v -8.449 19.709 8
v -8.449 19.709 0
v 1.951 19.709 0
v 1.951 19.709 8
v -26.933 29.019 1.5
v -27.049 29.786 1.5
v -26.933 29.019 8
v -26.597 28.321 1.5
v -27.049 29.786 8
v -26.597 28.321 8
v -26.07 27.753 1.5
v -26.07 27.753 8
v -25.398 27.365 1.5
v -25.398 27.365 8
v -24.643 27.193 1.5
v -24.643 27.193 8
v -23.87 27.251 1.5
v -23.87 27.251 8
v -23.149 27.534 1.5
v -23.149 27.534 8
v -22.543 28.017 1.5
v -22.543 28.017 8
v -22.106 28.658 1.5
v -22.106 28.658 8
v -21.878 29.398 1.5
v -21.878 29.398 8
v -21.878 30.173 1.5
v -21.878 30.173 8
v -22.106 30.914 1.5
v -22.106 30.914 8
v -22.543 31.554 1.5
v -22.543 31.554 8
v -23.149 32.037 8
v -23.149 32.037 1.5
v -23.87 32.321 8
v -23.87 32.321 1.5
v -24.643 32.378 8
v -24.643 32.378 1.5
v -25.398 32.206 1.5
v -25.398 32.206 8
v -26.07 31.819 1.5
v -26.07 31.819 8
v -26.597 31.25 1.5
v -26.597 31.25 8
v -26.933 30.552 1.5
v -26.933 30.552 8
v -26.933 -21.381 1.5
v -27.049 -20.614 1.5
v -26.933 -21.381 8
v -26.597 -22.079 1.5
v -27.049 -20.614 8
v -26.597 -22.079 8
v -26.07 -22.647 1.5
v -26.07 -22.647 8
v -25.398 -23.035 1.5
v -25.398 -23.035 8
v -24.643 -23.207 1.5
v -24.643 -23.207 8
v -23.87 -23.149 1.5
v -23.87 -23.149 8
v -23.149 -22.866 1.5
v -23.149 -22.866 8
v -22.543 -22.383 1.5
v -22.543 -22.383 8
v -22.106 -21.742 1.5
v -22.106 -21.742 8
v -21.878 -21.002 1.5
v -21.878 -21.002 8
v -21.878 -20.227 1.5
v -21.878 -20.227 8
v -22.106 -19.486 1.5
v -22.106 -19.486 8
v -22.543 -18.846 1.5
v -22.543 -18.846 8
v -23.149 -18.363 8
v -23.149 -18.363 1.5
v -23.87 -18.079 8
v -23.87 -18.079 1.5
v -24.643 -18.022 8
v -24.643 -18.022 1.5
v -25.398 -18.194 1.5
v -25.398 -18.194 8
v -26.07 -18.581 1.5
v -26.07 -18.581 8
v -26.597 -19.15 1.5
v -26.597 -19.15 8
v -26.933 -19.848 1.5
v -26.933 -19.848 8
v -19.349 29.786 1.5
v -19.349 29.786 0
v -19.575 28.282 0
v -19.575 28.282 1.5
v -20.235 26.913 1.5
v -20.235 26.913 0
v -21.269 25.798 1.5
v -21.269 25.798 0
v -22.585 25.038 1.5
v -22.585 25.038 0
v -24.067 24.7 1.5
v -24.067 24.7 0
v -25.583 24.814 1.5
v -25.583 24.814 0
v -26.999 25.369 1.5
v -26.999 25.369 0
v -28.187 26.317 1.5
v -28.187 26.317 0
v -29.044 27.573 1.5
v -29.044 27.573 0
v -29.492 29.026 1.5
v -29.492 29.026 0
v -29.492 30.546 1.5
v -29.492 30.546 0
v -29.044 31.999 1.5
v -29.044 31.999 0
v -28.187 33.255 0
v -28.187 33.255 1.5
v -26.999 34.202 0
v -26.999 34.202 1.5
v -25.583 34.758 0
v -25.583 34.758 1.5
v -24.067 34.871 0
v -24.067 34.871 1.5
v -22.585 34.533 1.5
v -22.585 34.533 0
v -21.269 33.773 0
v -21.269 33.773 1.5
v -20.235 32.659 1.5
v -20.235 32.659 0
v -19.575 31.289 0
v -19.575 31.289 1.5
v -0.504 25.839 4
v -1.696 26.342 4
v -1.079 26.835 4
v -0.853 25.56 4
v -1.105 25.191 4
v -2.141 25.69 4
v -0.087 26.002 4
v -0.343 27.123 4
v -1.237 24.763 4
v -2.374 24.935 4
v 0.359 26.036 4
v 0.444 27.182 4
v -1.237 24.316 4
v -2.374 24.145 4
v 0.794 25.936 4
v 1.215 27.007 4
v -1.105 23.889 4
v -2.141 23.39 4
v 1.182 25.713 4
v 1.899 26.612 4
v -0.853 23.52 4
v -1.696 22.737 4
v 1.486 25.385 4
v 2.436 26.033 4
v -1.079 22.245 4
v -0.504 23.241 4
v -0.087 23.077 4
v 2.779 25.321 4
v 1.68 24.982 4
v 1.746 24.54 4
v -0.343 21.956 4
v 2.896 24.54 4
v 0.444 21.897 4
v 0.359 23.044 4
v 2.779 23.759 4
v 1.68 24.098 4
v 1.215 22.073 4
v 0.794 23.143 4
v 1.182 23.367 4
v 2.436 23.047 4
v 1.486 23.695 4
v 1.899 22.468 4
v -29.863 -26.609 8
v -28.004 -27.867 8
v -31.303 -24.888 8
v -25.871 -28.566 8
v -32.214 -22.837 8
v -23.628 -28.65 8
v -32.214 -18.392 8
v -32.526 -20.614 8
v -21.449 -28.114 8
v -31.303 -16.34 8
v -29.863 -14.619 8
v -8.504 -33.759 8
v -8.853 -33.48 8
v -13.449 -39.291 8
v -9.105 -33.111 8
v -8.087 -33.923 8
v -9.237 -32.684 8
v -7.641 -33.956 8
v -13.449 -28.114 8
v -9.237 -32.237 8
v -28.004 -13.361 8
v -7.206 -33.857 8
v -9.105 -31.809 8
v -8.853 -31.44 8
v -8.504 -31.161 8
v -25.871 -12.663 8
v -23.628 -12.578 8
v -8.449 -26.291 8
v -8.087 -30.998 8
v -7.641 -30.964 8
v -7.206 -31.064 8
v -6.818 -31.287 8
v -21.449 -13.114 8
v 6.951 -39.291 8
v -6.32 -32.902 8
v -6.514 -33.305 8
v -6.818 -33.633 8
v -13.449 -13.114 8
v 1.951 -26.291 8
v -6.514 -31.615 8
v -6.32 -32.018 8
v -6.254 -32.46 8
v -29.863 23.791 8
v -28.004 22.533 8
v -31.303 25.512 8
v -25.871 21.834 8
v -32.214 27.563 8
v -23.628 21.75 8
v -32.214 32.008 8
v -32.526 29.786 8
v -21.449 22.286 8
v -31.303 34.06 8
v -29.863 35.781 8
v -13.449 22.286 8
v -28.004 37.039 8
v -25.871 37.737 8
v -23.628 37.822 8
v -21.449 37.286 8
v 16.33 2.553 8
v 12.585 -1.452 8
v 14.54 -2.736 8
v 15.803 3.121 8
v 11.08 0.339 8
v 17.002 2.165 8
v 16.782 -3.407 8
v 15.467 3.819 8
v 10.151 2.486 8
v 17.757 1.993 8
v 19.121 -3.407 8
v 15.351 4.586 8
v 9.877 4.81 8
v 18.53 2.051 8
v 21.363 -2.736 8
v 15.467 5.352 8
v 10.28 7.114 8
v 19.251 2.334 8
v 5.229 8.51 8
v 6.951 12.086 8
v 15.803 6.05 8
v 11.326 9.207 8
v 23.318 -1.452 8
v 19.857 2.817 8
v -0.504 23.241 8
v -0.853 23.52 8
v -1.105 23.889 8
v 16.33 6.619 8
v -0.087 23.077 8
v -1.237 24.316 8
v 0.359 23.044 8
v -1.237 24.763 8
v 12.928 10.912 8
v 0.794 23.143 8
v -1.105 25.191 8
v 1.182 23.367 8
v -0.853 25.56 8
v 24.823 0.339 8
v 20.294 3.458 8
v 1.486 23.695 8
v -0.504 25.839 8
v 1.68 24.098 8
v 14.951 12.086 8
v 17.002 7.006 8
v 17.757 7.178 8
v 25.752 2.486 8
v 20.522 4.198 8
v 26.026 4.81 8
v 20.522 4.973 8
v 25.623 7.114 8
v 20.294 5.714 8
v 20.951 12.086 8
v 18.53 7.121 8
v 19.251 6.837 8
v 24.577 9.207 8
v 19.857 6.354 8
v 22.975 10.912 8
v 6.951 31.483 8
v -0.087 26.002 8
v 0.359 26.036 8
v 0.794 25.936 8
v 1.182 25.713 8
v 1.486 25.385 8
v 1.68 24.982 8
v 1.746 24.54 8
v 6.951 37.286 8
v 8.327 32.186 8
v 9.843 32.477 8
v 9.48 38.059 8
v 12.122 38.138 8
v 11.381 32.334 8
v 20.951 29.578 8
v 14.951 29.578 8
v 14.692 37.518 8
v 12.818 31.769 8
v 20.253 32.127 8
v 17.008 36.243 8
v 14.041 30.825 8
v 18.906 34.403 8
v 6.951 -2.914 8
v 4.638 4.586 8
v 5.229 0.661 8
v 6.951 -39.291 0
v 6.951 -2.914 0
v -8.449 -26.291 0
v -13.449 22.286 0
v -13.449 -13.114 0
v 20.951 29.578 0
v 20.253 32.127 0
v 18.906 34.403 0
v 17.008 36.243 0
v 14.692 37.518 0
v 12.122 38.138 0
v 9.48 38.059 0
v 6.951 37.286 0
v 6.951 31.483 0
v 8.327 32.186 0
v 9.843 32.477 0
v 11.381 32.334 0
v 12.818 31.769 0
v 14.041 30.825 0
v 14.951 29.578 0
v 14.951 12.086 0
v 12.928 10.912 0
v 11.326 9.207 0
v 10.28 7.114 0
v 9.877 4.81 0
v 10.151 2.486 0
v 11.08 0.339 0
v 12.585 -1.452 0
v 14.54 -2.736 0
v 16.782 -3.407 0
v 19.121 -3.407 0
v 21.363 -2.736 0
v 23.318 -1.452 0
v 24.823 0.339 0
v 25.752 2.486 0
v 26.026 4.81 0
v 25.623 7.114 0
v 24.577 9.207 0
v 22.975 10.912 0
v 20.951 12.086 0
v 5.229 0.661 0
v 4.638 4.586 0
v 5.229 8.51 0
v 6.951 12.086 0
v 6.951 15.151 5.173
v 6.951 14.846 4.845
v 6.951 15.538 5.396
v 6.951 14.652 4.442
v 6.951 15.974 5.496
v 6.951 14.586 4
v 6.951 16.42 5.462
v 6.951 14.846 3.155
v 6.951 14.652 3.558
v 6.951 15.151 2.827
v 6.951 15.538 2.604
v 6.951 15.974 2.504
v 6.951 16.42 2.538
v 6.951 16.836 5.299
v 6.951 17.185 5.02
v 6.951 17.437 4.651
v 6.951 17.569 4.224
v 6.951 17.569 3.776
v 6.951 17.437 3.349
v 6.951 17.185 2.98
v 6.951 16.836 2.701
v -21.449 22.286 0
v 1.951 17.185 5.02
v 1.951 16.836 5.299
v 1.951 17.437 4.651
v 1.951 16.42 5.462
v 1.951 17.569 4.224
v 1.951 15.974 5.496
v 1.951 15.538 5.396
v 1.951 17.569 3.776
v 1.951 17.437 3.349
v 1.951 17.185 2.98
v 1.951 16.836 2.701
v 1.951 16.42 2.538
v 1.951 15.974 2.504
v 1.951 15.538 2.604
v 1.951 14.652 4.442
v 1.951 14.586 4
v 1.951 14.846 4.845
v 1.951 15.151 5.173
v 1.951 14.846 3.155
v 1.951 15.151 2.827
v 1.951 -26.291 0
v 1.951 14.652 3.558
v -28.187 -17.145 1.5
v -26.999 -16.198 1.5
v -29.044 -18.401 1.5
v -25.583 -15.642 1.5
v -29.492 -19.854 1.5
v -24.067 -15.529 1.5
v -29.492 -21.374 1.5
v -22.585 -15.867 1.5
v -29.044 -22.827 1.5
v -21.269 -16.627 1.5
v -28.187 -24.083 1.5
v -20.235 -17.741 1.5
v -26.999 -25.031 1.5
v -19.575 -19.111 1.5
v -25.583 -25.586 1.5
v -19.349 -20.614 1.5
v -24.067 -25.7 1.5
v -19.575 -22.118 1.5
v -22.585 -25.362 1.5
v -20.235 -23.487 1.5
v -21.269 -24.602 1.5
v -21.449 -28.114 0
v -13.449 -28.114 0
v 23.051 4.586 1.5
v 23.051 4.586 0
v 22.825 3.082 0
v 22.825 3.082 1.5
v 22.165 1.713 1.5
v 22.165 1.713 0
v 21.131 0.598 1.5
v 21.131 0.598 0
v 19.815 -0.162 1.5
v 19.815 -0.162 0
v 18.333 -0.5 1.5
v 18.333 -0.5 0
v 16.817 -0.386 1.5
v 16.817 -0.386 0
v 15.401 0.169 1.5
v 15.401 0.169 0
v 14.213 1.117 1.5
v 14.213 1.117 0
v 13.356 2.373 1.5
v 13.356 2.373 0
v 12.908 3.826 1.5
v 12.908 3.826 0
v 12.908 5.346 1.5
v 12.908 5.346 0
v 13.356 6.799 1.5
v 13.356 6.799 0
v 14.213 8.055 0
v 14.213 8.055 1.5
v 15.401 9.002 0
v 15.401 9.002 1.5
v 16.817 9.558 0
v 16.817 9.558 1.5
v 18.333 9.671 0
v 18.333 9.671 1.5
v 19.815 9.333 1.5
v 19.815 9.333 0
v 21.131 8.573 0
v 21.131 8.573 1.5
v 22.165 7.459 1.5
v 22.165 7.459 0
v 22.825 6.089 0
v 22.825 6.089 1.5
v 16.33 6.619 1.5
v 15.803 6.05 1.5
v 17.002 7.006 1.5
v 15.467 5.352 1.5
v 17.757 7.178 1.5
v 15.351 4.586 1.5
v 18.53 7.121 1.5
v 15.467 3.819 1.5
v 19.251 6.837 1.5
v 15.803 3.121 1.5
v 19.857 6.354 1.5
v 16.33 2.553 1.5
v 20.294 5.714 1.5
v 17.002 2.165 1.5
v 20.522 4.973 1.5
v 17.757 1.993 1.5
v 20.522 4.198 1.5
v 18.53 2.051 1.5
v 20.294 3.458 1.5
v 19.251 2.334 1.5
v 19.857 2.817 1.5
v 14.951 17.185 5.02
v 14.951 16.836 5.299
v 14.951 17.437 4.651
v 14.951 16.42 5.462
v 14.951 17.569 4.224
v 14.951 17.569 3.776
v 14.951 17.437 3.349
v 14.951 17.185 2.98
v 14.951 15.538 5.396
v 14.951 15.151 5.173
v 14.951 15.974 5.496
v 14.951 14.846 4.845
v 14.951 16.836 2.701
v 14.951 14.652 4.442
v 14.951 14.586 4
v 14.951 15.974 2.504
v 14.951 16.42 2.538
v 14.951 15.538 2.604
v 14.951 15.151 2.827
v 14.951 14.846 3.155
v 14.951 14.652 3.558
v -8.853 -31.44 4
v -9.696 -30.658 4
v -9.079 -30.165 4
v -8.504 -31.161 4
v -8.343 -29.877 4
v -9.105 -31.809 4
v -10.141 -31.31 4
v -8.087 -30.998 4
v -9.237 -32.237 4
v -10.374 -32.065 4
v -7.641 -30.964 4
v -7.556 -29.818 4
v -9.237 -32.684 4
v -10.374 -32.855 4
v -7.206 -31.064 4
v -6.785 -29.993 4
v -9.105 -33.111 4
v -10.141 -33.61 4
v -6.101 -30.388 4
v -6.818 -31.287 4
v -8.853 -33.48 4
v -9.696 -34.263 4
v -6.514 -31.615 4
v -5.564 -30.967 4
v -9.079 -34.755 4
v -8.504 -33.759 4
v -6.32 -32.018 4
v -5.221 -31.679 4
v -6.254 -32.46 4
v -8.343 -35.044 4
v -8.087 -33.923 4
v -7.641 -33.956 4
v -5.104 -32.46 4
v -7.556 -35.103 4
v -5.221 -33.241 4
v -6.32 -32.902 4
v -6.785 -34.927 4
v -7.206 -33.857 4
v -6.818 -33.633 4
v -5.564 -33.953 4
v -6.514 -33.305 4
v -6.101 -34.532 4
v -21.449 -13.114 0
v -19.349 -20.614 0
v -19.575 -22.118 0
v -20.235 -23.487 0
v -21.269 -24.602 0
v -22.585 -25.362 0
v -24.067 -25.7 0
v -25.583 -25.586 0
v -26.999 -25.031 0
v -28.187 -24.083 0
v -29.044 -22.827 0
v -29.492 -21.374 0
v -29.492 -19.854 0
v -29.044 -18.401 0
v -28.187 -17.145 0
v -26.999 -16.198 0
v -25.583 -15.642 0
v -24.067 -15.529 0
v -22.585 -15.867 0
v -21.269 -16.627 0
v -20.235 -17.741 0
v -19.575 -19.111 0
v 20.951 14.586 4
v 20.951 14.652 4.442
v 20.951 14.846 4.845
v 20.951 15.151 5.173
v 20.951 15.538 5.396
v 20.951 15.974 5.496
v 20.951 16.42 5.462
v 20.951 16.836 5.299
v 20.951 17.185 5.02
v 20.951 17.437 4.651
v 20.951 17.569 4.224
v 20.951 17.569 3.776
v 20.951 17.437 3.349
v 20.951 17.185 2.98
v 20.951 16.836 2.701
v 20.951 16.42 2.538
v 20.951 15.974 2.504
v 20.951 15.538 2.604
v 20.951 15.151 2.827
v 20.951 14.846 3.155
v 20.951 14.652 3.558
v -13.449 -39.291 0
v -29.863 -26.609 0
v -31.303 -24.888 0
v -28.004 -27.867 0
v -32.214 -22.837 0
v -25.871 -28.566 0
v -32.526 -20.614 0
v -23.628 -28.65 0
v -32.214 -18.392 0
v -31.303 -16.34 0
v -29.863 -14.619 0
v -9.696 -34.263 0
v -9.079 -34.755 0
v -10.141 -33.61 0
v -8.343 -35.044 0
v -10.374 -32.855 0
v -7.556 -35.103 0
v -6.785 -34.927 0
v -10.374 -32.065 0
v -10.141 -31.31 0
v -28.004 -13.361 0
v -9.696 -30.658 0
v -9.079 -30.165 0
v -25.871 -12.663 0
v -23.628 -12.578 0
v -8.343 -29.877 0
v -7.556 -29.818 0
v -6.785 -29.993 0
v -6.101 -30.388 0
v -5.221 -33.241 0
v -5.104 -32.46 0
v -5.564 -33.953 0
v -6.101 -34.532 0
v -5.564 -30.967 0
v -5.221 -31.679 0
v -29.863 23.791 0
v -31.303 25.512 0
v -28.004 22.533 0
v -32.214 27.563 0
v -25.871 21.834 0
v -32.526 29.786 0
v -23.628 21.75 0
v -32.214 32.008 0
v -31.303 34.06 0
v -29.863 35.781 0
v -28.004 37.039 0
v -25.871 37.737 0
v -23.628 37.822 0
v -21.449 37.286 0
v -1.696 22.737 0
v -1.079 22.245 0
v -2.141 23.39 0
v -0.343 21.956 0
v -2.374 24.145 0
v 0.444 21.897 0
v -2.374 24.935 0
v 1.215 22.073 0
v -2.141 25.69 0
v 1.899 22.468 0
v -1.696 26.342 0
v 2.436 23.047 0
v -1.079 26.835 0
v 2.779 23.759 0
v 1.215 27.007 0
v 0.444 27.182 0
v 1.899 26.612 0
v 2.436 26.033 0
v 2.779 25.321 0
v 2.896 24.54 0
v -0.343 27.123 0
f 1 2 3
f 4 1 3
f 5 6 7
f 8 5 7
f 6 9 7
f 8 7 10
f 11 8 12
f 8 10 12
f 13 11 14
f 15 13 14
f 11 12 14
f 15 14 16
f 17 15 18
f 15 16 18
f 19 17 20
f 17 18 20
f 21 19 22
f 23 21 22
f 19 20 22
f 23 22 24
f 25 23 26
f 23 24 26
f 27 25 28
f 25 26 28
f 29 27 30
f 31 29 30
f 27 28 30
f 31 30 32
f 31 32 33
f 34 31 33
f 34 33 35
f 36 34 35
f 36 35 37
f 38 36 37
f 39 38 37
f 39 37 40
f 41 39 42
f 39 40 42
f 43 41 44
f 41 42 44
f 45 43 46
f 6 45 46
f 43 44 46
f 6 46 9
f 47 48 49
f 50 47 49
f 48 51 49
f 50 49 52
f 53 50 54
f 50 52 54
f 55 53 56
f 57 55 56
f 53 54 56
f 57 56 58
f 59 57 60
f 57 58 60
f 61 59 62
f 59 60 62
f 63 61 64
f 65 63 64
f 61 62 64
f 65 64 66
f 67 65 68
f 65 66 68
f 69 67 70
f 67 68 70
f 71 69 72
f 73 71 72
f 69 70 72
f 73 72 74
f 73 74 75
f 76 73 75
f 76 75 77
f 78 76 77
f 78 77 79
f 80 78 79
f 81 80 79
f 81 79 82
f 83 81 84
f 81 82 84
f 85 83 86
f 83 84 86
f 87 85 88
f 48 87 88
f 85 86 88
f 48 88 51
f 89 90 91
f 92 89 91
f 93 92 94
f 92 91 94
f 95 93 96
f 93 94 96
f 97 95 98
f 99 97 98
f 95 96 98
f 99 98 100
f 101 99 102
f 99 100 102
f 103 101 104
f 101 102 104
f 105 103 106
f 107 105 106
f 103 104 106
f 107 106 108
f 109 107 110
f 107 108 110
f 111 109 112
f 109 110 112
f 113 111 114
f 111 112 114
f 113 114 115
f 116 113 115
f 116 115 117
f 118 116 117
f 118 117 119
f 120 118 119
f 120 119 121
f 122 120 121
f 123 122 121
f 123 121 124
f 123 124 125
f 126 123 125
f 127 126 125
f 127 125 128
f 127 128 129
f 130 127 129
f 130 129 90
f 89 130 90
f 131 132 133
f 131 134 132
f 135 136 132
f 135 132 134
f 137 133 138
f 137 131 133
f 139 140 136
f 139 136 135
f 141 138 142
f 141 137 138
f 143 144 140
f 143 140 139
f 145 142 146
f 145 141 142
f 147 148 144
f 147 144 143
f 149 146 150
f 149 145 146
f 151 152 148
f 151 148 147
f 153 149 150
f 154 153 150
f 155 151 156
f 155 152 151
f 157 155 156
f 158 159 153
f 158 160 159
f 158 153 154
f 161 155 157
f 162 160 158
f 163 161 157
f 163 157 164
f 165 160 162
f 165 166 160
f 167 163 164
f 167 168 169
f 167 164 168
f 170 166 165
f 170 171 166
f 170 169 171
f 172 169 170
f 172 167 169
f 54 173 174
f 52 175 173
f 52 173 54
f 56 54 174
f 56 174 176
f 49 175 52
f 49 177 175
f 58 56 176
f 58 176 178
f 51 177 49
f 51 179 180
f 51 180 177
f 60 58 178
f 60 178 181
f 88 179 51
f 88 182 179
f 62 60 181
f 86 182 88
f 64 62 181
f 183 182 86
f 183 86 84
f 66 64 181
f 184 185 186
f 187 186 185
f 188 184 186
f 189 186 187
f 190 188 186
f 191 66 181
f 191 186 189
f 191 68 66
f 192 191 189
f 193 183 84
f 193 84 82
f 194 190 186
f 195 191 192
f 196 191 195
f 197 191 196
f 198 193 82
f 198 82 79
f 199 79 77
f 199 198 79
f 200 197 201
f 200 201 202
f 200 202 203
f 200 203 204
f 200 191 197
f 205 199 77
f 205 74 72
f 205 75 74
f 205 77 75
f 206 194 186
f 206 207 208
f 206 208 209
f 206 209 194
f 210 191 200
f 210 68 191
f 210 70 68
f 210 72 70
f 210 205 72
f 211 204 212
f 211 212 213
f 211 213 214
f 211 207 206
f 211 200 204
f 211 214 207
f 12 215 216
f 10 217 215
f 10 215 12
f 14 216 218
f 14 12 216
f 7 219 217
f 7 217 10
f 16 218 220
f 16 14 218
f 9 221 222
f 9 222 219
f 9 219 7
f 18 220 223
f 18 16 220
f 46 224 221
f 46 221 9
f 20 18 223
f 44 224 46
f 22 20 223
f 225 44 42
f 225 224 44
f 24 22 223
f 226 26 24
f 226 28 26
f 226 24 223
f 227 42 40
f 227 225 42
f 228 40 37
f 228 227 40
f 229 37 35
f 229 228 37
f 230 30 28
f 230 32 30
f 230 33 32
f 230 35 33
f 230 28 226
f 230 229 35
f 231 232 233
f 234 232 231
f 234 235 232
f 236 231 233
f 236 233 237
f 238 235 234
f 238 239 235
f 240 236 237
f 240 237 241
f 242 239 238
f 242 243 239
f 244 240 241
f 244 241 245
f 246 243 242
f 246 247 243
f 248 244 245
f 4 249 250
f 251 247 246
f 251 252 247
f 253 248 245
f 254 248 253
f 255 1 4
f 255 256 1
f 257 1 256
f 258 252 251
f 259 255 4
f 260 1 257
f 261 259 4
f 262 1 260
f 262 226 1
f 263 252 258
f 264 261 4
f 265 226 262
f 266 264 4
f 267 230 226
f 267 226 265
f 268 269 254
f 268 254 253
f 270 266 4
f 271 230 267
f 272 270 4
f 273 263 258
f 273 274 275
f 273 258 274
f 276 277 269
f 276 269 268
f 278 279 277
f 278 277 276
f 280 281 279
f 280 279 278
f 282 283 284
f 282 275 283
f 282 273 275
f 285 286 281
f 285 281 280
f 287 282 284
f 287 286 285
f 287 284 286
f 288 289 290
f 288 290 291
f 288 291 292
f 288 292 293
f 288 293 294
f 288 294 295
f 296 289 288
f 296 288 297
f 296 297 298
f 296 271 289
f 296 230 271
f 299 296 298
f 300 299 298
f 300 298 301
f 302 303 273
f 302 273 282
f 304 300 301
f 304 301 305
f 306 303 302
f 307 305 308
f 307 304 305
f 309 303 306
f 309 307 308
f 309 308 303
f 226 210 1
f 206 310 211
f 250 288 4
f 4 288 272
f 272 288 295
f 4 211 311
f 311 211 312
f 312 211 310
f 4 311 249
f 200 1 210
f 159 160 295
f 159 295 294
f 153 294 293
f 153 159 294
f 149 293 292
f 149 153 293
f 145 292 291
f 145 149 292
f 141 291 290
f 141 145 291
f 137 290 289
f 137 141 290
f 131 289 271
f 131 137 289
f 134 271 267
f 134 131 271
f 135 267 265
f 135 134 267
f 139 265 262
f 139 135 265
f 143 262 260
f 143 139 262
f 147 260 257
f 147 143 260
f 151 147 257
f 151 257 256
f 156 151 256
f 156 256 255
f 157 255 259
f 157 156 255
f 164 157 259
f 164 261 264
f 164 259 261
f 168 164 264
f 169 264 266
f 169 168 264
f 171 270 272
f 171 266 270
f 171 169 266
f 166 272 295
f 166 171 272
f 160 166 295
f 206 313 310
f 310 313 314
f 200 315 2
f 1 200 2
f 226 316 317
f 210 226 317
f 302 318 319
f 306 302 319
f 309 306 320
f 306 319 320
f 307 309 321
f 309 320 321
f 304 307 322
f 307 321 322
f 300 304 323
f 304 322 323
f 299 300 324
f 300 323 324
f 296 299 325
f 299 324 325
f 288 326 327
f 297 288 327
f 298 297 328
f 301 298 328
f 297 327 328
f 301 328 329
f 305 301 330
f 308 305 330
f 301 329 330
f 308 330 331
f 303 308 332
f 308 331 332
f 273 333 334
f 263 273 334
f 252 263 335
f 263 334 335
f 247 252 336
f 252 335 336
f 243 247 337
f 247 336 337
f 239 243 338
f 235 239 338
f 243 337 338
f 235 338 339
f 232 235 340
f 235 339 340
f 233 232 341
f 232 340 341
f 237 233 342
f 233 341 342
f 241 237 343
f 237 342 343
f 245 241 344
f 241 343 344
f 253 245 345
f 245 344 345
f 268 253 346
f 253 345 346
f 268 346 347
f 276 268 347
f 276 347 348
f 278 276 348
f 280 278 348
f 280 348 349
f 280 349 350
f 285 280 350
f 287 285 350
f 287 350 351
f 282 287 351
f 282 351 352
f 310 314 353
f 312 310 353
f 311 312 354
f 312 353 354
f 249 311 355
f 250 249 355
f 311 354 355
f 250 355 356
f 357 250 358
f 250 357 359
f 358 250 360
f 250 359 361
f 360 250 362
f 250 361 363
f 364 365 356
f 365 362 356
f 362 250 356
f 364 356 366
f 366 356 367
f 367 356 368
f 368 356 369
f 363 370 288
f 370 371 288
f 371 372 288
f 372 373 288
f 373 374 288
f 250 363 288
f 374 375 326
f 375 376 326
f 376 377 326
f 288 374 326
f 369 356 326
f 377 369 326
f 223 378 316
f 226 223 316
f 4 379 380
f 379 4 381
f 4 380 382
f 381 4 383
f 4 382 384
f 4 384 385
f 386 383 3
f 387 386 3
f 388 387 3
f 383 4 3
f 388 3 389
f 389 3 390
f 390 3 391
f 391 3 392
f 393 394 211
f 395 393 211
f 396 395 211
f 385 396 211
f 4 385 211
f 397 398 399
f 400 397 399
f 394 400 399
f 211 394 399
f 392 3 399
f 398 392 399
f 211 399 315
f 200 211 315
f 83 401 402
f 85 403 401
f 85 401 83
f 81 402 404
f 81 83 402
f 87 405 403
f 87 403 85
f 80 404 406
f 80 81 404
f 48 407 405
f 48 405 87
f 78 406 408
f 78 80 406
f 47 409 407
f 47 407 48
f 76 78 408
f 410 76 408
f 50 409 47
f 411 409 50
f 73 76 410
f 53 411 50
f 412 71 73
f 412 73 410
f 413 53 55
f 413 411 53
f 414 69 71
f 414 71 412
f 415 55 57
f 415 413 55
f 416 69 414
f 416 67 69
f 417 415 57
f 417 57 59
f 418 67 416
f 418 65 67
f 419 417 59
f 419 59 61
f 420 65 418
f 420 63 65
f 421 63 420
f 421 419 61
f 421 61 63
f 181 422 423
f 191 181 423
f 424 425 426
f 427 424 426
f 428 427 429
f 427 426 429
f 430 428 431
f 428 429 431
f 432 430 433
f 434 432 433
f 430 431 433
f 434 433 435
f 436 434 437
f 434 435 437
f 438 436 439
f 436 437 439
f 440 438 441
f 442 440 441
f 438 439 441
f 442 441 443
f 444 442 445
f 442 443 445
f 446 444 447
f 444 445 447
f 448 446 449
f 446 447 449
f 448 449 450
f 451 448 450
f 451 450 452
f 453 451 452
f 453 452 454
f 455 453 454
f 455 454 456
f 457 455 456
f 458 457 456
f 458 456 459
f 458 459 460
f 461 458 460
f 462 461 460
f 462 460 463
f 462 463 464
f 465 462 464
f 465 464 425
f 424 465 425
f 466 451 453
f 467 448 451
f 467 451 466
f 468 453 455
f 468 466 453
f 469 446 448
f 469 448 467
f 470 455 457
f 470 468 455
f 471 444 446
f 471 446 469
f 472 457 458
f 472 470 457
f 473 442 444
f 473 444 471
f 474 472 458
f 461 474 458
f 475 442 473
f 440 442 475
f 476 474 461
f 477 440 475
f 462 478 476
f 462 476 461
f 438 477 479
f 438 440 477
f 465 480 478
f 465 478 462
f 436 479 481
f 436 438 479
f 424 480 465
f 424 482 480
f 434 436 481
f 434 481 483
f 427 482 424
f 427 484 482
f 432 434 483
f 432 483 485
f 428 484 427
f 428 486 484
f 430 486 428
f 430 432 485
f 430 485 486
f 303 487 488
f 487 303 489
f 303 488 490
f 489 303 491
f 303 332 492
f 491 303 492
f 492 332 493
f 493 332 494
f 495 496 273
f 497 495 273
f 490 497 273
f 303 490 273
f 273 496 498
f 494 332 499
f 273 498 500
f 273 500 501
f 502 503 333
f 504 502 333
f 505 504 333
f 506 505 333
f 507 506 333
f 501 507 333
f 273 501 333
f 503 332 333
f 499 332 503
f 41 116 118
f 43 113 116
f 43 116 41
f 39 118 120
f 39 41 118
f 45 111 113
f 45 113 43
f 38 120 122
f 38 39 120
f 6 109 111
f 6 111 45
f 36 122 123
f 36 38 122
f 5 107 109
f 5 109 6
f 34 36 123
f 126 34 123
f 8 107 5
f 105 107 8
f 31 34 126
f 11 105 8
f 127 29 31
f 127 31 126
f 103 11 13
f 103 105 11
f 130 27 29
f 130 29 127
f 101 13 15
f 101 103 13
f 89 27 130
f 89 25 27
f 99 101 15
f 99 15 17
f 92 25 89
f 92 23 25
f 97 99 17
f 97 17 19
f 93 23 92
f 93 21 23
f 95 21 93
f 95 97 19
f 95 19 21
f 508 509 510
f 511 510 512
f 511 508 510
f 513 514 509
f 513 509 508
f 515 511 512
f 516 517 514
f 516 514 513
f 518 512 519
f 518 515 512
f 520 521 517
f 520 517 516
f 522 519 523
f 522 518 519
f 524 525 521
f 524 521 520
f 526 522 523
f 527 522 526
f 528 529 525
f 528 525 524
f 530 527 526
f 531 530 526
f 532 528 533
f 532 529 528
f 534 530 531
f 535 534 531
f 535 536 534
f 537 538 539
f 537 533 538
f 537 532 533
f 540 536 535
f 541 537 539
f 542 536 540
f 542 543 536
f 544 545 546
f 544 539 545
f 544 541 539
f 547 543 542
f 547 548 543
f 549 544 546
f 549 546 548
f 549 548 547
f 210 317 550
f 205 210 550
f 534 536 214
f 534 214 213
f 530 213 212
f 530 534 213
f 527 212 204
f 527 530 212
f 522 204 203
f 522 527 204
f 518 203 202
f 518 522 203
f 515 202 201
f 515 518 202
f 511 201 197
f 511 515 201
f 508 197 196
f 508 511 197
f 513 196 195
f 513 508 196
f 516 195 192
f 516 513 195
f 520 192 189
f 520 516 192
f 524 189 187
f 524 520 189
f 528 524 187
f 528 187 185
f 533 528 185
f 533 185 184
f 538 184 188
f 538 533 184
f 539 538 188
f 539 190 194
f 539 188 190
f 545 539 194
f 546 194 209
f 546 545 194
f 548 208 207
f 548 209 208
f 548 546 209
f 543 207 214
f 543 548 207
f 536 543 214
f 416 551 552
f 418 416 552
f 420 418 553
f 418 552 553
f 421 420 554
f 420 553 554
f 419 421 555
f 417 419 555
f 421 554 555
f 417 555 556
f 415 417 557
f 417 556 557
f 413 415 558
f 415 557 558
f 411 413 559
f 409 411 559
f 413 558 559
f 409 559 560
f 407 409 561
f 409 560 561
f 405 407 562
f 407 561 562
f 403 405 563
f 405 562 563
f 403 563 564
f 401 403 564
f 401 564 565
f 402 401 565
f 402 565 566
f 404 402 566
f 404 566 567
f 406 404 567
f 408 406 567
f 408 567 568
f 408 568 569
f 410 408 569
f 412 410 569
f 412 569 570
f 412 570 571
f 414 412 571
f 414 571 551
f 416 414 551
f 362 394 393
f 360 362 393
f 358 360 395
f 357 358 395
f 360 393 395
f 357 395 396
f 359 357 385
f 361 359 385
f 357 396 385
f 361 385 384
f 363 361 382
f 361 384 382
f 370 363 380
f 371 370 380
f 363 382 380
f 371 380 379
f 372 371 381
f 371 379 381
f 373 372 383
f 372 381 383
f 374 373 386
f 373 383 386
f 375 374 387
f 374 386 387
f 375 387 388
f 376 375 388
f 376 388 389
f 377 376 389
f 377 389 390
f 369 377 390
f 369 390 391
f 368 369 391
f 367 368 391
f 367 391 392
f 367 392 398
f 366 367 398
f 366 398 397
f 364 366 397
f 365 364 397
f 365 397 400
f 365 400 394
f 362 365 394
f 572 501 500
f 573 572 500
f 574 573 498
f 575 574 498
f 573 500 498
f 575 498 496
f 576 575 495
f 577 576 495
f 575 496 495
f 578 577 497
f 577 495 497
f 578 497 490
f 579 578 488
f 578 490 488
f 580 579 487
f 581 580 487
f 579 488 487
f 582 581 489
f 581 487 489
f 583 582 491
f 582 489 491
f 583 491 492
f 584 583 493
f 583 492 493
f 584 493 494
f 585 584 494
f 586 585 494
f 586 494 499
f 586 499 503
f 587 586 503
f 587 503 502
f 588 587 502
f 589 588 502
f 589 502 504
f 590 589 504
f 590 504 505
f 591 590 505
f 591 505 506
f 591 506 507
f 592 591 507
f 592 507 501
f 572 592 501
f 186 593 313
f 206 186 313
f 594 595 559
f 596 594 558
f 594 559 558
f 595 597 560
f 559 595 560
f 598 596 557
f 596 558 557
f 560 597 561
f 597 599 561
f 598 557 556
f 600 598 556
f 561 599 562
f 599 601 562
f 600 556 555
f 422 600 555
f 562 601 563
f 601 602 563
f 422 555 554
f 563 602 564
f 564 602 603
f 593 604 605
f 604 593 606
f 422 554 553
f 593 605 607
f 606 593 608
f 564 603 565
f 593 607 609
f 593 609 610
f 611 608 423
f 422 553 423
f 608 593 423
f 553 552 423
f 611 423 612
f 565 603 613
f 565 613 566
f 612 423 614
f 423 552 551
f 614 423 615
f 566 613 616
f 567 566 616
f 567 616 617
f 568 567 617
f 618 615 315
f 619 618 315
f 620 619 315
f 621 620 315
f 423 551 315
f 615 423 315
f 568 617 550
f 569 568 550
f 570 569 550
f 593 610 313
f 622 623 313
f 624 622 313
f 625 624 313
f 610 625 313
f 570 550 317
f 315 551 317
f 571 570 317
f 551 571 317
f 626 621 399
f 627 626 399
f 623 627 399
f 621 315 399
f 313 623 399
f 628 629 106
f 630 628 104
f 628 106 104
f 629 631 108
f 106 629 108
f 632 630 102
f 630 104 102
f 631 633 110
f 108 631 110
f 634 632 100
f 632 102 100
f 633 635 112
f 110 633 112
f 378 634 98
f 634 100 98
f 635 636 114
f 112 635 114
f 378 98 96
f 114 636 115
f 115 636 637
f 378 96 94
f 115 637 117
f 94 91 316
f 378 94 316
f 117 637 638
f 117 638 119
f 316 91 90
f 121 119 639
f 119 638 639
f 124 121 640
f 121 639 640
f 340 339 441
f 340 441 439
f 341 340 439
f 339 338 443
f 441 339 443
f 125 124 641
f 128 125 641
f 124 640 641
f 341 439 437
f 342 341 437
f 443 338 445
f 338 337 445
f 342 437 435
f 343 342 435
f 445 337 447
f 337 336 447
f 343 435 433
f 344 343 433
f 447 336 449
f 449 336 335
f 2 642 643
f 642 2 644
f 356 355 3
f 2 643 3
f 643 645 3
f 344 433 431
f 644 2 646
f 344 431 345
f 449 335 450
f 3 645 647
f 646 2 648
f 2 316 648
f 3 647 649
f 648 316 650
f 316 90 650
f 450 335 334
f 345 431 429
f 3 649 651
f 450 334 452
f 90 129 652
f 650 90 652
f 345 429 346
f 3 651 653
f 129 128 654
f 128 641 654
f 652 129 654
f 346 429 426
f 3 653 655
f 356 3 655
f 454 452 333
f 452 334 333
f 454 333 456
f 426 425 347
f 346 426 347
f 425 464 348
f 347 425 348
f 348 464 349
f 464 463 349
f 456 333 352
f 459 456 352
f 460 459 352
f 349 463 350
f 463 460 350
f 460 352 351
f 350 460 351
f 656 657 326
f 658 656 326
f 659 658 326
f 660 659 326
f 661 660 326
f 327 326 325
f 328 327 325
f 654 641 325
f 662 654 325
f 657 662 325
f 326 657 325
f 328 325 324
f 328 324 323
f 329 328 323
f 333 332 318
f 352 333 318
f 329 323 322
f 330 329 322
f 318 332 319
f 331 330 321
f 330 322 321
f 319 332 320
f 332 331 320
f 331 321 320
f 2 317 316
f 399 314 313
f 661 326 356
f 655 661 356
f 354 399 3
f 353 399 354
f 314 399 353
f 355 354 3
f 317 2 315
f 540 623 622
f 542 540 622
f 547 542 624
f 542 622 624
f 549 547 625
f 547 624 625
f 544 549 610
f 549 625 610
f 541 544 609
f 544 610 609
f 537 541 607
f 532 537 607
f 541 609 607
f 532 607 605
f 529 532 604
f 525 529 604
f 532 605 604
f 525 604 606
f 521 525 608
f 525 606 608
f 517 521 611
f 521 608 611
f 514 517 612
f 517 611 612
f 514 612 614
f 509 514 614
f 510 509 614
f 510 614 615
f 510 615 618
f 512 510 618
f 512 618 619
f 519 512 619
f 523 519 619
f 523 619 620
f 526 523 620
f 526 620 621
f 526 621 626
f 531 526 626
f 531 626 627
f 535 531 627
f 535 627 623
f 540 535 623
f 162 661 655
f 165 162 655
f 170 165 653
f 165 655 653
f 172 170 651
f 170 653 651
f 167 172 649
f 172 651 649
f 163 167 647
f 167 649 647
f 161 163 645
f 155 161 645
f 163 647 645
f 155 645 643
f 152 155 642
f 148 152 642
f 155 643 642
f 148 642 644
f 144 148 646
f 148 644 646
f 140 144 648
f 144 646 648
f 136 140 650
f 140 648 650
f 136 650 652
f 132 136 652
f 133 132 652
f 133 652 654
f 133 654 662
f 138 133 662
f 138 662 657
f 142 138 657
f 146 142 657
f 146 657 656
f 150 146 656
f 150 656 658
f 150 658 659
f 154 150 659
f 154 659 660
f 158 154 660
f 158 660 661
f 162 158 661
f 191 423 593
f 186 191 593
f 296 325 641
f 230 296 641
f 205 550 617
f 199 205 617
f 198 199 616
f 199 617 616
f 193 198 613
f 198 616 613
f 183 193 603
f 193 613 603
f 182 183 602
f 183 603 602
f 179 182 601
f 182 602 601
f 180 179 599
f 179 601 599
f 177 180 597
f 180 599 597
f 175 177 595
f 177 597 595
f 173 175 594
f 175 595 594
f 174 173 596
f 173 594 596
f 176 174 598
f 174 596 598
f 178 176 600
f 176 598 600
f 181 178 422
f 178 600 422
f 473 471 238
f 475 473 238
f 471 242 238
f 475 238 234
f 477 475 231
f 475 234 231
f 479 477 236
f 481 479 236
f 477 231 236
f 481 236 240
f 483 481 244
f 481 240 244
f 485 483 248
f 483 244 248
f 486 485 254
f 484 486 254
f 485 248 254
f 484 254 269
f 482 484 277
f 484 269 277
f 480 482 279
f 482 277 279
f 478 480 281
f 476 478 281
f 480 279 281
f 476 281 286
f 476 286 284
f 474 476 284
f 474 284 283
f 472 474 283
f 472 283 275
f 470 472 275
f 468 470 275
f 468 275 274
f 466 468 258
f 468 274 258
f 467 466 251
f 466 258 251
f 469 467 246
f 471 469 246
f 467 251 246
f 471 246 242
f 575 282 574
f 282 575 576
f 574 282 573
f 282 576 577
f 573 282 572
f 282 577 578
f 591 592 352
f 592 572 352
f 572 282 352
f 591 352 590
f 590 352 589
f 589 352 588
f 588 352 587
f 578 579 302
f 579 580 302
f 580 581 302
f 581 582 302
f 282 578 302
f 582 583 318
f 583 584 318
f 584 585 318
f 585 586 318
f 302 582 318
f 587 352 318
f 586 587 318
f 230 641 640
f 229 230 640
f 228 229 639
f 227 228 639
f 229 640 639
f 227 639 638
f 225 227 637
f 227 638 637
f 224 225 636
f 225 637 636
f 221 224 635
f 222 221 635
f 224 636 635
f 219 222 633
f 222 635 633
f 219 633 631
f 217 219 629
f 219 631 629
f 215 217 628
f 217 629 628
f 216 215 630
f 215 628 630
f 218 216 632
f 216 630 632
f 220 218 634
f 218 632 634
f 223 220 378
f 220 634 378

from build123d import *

# Parameters (mm, degrees)
F0_R           = 1.5
F1_DEPTH       = 8
F2_D           = 5.2
F2_DEPTH       = 30
F2_CBORE_D     = 10.2
F2_CBORE_DEPTH = 1.5
F2_TIP         = 1.5622376095
F4_D           = 3
F4_DEPTH       = 20
F4_TIP         = 0.9012909285
F5_D           = 3
F5_DEPTH       = 20
F5_CBORE_D     = 5.3
F5_CBORE_DEPTH = 4
F5_TIP         = 0.9012909285


with BuildPart() as f1:
    # F0 (on Top) → F1 (new body)
    with BuildSketch(Plane.XY):
        with BuildLine():
            Line((-21.4485637844, 22.2857501358), (-21.4485637844, 37.2857501358))
            ThreePointArc((-21.4485637844, 37.2857501358), (-32.5263109951, 29.7857501358), (-21.4485637844, 22.2857501358))
        make_face()
        with BuildLine():
            ThreePointArc((-16.3708165737, 29.7857501358), (-17.7596460232, 34.3143679364), (-21.4485637844, 37.2857501358))
            Line((-21.4485637844, 37.2857501358), (-21.4485637844, 22.2857501358))
            ThreePointArc((-21.4485637844, 22.2857501358), (-17.7596460232, 25.2571323352), (-16.3708165737, 29.7857501358))
        make_face()
        with BuildLine():
            Line((-13.4485637844, 22.2857501358), (-13.4485637844, 37.2857501358))
            Line((-13.4485637844, 37.2857501358), (-21.4485637844, 37.2857501358))
            ThreePointArc((-21.4485637844, 37.2857501358), (-17.7596460232, 34.3143679364), (-16.3708165737, 29.7857501358))
            ThreePointArc((-16.3708165737, 29.7857501358), (-17.7596460232, 25.2571323352), (-21.4485637844, 22.2857501358))
            Line((-21.4485637844, 22.2857501358), (-13.4485637844, 22.2857501358))
        make_face()
        with BuildLine():
            Line((6.9514365147, 31.482860446), (6.9514365147, 37.2857501358))
            Line((6.9514365147, 37.2857501358), (-13.4485637844, 37.2857501358))
            Line((-13.4485637844, 37.2857501358), (-13.4485637844, 22.2857501358))
            Line((-13.4485637844, 22.2857501358), (-13.4485637844, -13.1142501633))
            Line((-13.4485637844, -13.1142501633), (-13.4485637844, -28.1142501633))
            Line((-13.4485637844, -28.1142501633), (-13.4485637844, -39.2912365496))
            Line((-13.4485637844, -39.2912365496), (6.9514365147, -39.2912365496))
            Line((6.9514365147, -39.2912365496), (6.9514365147, -28.1142501633))
            Line((6.9514365147, -28.1142501633), (6.9514365147, -2.9142498642))
            ThreePointArc((6.9514365147, -2.9142498642), (4.637909559, 4.5857501358), (6.9514365147, 12.0857501358))
            Line((6.9514365147, 12.0857501358), (6.9514365147, 31.482860446))
        make_face()
        with Locations((-7.7535887534, -32.4602356078)):
            Circle(F0_R, mode=Mode.SUBTRACT)
        Polygon((-1.2058451539, 19.7087634504), (1.1941548461, 19.7087634504), (1.9514365147, 19.7087634504), (1.9514365147, -26.2912365496), (-8.4485637844, -26.2912365496), (-8.4485637844, 19.7087634504), align=None, mode=Mode.SUBTRACT)
        with Locations((0.2464112466, 24.5397643922)):
            Circle(F0_R, mode=Mode.SUBTRACT)
        with BuildLine():
            ThreePointArc((20.9514365147, 29.5776203275), (15.8929462828, 36.9579798621), (6.9514365147, 37.2857501358))
            Line((6.9514365147, 37.2857501358), (6.9514365147, 31.482860446))
            ThreePointArc((6.9514365147, 31.482860446), (11.3811141914, 32.3344336643), (14.9514365147, 29.5776203275))
            Line((14.9514365147, 29.5776203275), (14.9514365147, 12.0857501358))
            ThreePointArc((14.9514365147, 12.0857501358), (17.9514365147, 12.6634973465), (20.9514365147, 12.0857501358))
            Line((20.9514365147, 12.0857501358), (20.9514365147, 26.9164390002))
            Line((20.9514365147, 26.9164390002), (20.9514365147, 29.5776203275))
        make_face()
        with BuildLine():
            Line((20.9514365147, 12.0857501358), (14.9514365147, 12.0857501358))
            Line((14.9514365147, 12.0857501358), (14.9514365147, -2.9142498642))
            ThreePointArc((14.9514365147, -2.9142498642), (22.4800543153, -2.1031676254), (26.0291837254, 4.5857501358))
            ThreePointArc((26.0291837254, 4.5857501358), (24.6403542759, 9.1143679364), (20.9514365147, 12.0857501358))
        make_face()
        with BuildLine():
            ThreePointArc((20.9514365147, 12.0857501358), (17.9514365147, 12.6634973465), (14.9514365147, 12.0857501358))
            Line((14.9514365147, 12.0857501358), (20.9514365147, 12.0857501358))
        make_face()
        with BuildLine():
            Line((14.9514365147, -2.9142498642), (14.9514365147, 12.0857501358))
            ThreePointArc((14.9514365147, 12.0857501358), (9.873689304, 4.5857501358), (14.9514365147, -2.9142498642))
        make_face()
        with BuildLine():
            Line((-13.4485637844, -28.1142501633), (-13.4485637844, -13.1142501633))
            Line((-13.4485637844, -13.1142501633), (-21.4485637844, -13.1142501633))
            ThreePointArc((-21.4485637844, -13.1142501633), (-17.7596460232, -16.0856323627), (-16.3708165737, -20.6142501633))
            ThreePointArc((-16.3708165737, -20.6142501633), (-17.7596460232, -25.1428679639), (-21.4485637844, -28.1142501633))
            Line((-21.4485637844, -28.1142501633), (-13.4485637844, -28.1142501633))
        make_face()
        with BuildLine():
            ThreePointArc((-16.3708165737, -20.6142501633), (-17.7596460232, -16.0856323627), (-21.4485637844, -13.1142501633))
            Line((-21.4485637844, -13.1142501633), (-21.4485637844, -28.1142501633))
            ThreePointArc((-21.4485637844, -28.1142501633), (-17.7596460232, -25.1428679639), (-16.3708165737, -20.6142501633))
        make_face()
        with BuildLine():
            Line((-21.4485637844, -28.1142501633), (-21.4485637844, -13.1142501633))
            ThreePointArc((-21.4485637844, -13.1142501633), (-32.5263109951, -20.6142501633), (-21.4485637844, -28.1142501633))
        make_face()
    extrude(amount=F1_DEPTH)

    # F2
    with Locations(Plane(origin=(0, 0, 0), x_dir=(1, 0, 0), z_dir=(0, 0, -1))):
        with Locations((17.9514365147, -4.5857501358), (-24.4485637844, -29.7857501358), (-24.4485637844, 20.6142501633)):
            CounterBoreHole(F2_D / 2, F2_CBORE_D / 2, F2_CBORE_DEPTH, depth=F2_DEPTH)
            with Locations((0, 0, -(F2_DEPTH + F2_TIP / 2))):  # 118° drill point
                Cone(0, F2_D / 2, F2_TIP, mode=Mode.SUBTRACT)

    # F4
    with Locations(Plane.YZ.offset(20.9514365147)):
        with Locations((16.0857501358, 4)):
            Hole(F4_D / 2, depth=F4_DEPTH)
            with Locations((0, 0, -(F4_DEPTH + F4_TIP / 2))):  # 118° drill point
                Cone(0, F4_D / 2, F4_TIP, mode=Mode.SUBTRACT)

    # F5
    with Locations(Plane(origin=(0, 0, 0), x_dir=(1, 0, 0), z_dir=(0, 0, -1))):
        with Locations((0.2464112466, -24.5397643922), (-7.7535887534, 32.4602356078)):
            CounterBoreHole(F5_D / 2, F5_CBORE_D / 2, F5_CBORE_DEPTH, depth=F5_DEPTH)
            with Locations((0, 0, -(F5_DEPTH + F5_TIP / 2))):  # 118° drill point
                Cone(0, F5_D / 2, F5_TIP, mode=Mode.SUBTRACT)


solid = f1.part
